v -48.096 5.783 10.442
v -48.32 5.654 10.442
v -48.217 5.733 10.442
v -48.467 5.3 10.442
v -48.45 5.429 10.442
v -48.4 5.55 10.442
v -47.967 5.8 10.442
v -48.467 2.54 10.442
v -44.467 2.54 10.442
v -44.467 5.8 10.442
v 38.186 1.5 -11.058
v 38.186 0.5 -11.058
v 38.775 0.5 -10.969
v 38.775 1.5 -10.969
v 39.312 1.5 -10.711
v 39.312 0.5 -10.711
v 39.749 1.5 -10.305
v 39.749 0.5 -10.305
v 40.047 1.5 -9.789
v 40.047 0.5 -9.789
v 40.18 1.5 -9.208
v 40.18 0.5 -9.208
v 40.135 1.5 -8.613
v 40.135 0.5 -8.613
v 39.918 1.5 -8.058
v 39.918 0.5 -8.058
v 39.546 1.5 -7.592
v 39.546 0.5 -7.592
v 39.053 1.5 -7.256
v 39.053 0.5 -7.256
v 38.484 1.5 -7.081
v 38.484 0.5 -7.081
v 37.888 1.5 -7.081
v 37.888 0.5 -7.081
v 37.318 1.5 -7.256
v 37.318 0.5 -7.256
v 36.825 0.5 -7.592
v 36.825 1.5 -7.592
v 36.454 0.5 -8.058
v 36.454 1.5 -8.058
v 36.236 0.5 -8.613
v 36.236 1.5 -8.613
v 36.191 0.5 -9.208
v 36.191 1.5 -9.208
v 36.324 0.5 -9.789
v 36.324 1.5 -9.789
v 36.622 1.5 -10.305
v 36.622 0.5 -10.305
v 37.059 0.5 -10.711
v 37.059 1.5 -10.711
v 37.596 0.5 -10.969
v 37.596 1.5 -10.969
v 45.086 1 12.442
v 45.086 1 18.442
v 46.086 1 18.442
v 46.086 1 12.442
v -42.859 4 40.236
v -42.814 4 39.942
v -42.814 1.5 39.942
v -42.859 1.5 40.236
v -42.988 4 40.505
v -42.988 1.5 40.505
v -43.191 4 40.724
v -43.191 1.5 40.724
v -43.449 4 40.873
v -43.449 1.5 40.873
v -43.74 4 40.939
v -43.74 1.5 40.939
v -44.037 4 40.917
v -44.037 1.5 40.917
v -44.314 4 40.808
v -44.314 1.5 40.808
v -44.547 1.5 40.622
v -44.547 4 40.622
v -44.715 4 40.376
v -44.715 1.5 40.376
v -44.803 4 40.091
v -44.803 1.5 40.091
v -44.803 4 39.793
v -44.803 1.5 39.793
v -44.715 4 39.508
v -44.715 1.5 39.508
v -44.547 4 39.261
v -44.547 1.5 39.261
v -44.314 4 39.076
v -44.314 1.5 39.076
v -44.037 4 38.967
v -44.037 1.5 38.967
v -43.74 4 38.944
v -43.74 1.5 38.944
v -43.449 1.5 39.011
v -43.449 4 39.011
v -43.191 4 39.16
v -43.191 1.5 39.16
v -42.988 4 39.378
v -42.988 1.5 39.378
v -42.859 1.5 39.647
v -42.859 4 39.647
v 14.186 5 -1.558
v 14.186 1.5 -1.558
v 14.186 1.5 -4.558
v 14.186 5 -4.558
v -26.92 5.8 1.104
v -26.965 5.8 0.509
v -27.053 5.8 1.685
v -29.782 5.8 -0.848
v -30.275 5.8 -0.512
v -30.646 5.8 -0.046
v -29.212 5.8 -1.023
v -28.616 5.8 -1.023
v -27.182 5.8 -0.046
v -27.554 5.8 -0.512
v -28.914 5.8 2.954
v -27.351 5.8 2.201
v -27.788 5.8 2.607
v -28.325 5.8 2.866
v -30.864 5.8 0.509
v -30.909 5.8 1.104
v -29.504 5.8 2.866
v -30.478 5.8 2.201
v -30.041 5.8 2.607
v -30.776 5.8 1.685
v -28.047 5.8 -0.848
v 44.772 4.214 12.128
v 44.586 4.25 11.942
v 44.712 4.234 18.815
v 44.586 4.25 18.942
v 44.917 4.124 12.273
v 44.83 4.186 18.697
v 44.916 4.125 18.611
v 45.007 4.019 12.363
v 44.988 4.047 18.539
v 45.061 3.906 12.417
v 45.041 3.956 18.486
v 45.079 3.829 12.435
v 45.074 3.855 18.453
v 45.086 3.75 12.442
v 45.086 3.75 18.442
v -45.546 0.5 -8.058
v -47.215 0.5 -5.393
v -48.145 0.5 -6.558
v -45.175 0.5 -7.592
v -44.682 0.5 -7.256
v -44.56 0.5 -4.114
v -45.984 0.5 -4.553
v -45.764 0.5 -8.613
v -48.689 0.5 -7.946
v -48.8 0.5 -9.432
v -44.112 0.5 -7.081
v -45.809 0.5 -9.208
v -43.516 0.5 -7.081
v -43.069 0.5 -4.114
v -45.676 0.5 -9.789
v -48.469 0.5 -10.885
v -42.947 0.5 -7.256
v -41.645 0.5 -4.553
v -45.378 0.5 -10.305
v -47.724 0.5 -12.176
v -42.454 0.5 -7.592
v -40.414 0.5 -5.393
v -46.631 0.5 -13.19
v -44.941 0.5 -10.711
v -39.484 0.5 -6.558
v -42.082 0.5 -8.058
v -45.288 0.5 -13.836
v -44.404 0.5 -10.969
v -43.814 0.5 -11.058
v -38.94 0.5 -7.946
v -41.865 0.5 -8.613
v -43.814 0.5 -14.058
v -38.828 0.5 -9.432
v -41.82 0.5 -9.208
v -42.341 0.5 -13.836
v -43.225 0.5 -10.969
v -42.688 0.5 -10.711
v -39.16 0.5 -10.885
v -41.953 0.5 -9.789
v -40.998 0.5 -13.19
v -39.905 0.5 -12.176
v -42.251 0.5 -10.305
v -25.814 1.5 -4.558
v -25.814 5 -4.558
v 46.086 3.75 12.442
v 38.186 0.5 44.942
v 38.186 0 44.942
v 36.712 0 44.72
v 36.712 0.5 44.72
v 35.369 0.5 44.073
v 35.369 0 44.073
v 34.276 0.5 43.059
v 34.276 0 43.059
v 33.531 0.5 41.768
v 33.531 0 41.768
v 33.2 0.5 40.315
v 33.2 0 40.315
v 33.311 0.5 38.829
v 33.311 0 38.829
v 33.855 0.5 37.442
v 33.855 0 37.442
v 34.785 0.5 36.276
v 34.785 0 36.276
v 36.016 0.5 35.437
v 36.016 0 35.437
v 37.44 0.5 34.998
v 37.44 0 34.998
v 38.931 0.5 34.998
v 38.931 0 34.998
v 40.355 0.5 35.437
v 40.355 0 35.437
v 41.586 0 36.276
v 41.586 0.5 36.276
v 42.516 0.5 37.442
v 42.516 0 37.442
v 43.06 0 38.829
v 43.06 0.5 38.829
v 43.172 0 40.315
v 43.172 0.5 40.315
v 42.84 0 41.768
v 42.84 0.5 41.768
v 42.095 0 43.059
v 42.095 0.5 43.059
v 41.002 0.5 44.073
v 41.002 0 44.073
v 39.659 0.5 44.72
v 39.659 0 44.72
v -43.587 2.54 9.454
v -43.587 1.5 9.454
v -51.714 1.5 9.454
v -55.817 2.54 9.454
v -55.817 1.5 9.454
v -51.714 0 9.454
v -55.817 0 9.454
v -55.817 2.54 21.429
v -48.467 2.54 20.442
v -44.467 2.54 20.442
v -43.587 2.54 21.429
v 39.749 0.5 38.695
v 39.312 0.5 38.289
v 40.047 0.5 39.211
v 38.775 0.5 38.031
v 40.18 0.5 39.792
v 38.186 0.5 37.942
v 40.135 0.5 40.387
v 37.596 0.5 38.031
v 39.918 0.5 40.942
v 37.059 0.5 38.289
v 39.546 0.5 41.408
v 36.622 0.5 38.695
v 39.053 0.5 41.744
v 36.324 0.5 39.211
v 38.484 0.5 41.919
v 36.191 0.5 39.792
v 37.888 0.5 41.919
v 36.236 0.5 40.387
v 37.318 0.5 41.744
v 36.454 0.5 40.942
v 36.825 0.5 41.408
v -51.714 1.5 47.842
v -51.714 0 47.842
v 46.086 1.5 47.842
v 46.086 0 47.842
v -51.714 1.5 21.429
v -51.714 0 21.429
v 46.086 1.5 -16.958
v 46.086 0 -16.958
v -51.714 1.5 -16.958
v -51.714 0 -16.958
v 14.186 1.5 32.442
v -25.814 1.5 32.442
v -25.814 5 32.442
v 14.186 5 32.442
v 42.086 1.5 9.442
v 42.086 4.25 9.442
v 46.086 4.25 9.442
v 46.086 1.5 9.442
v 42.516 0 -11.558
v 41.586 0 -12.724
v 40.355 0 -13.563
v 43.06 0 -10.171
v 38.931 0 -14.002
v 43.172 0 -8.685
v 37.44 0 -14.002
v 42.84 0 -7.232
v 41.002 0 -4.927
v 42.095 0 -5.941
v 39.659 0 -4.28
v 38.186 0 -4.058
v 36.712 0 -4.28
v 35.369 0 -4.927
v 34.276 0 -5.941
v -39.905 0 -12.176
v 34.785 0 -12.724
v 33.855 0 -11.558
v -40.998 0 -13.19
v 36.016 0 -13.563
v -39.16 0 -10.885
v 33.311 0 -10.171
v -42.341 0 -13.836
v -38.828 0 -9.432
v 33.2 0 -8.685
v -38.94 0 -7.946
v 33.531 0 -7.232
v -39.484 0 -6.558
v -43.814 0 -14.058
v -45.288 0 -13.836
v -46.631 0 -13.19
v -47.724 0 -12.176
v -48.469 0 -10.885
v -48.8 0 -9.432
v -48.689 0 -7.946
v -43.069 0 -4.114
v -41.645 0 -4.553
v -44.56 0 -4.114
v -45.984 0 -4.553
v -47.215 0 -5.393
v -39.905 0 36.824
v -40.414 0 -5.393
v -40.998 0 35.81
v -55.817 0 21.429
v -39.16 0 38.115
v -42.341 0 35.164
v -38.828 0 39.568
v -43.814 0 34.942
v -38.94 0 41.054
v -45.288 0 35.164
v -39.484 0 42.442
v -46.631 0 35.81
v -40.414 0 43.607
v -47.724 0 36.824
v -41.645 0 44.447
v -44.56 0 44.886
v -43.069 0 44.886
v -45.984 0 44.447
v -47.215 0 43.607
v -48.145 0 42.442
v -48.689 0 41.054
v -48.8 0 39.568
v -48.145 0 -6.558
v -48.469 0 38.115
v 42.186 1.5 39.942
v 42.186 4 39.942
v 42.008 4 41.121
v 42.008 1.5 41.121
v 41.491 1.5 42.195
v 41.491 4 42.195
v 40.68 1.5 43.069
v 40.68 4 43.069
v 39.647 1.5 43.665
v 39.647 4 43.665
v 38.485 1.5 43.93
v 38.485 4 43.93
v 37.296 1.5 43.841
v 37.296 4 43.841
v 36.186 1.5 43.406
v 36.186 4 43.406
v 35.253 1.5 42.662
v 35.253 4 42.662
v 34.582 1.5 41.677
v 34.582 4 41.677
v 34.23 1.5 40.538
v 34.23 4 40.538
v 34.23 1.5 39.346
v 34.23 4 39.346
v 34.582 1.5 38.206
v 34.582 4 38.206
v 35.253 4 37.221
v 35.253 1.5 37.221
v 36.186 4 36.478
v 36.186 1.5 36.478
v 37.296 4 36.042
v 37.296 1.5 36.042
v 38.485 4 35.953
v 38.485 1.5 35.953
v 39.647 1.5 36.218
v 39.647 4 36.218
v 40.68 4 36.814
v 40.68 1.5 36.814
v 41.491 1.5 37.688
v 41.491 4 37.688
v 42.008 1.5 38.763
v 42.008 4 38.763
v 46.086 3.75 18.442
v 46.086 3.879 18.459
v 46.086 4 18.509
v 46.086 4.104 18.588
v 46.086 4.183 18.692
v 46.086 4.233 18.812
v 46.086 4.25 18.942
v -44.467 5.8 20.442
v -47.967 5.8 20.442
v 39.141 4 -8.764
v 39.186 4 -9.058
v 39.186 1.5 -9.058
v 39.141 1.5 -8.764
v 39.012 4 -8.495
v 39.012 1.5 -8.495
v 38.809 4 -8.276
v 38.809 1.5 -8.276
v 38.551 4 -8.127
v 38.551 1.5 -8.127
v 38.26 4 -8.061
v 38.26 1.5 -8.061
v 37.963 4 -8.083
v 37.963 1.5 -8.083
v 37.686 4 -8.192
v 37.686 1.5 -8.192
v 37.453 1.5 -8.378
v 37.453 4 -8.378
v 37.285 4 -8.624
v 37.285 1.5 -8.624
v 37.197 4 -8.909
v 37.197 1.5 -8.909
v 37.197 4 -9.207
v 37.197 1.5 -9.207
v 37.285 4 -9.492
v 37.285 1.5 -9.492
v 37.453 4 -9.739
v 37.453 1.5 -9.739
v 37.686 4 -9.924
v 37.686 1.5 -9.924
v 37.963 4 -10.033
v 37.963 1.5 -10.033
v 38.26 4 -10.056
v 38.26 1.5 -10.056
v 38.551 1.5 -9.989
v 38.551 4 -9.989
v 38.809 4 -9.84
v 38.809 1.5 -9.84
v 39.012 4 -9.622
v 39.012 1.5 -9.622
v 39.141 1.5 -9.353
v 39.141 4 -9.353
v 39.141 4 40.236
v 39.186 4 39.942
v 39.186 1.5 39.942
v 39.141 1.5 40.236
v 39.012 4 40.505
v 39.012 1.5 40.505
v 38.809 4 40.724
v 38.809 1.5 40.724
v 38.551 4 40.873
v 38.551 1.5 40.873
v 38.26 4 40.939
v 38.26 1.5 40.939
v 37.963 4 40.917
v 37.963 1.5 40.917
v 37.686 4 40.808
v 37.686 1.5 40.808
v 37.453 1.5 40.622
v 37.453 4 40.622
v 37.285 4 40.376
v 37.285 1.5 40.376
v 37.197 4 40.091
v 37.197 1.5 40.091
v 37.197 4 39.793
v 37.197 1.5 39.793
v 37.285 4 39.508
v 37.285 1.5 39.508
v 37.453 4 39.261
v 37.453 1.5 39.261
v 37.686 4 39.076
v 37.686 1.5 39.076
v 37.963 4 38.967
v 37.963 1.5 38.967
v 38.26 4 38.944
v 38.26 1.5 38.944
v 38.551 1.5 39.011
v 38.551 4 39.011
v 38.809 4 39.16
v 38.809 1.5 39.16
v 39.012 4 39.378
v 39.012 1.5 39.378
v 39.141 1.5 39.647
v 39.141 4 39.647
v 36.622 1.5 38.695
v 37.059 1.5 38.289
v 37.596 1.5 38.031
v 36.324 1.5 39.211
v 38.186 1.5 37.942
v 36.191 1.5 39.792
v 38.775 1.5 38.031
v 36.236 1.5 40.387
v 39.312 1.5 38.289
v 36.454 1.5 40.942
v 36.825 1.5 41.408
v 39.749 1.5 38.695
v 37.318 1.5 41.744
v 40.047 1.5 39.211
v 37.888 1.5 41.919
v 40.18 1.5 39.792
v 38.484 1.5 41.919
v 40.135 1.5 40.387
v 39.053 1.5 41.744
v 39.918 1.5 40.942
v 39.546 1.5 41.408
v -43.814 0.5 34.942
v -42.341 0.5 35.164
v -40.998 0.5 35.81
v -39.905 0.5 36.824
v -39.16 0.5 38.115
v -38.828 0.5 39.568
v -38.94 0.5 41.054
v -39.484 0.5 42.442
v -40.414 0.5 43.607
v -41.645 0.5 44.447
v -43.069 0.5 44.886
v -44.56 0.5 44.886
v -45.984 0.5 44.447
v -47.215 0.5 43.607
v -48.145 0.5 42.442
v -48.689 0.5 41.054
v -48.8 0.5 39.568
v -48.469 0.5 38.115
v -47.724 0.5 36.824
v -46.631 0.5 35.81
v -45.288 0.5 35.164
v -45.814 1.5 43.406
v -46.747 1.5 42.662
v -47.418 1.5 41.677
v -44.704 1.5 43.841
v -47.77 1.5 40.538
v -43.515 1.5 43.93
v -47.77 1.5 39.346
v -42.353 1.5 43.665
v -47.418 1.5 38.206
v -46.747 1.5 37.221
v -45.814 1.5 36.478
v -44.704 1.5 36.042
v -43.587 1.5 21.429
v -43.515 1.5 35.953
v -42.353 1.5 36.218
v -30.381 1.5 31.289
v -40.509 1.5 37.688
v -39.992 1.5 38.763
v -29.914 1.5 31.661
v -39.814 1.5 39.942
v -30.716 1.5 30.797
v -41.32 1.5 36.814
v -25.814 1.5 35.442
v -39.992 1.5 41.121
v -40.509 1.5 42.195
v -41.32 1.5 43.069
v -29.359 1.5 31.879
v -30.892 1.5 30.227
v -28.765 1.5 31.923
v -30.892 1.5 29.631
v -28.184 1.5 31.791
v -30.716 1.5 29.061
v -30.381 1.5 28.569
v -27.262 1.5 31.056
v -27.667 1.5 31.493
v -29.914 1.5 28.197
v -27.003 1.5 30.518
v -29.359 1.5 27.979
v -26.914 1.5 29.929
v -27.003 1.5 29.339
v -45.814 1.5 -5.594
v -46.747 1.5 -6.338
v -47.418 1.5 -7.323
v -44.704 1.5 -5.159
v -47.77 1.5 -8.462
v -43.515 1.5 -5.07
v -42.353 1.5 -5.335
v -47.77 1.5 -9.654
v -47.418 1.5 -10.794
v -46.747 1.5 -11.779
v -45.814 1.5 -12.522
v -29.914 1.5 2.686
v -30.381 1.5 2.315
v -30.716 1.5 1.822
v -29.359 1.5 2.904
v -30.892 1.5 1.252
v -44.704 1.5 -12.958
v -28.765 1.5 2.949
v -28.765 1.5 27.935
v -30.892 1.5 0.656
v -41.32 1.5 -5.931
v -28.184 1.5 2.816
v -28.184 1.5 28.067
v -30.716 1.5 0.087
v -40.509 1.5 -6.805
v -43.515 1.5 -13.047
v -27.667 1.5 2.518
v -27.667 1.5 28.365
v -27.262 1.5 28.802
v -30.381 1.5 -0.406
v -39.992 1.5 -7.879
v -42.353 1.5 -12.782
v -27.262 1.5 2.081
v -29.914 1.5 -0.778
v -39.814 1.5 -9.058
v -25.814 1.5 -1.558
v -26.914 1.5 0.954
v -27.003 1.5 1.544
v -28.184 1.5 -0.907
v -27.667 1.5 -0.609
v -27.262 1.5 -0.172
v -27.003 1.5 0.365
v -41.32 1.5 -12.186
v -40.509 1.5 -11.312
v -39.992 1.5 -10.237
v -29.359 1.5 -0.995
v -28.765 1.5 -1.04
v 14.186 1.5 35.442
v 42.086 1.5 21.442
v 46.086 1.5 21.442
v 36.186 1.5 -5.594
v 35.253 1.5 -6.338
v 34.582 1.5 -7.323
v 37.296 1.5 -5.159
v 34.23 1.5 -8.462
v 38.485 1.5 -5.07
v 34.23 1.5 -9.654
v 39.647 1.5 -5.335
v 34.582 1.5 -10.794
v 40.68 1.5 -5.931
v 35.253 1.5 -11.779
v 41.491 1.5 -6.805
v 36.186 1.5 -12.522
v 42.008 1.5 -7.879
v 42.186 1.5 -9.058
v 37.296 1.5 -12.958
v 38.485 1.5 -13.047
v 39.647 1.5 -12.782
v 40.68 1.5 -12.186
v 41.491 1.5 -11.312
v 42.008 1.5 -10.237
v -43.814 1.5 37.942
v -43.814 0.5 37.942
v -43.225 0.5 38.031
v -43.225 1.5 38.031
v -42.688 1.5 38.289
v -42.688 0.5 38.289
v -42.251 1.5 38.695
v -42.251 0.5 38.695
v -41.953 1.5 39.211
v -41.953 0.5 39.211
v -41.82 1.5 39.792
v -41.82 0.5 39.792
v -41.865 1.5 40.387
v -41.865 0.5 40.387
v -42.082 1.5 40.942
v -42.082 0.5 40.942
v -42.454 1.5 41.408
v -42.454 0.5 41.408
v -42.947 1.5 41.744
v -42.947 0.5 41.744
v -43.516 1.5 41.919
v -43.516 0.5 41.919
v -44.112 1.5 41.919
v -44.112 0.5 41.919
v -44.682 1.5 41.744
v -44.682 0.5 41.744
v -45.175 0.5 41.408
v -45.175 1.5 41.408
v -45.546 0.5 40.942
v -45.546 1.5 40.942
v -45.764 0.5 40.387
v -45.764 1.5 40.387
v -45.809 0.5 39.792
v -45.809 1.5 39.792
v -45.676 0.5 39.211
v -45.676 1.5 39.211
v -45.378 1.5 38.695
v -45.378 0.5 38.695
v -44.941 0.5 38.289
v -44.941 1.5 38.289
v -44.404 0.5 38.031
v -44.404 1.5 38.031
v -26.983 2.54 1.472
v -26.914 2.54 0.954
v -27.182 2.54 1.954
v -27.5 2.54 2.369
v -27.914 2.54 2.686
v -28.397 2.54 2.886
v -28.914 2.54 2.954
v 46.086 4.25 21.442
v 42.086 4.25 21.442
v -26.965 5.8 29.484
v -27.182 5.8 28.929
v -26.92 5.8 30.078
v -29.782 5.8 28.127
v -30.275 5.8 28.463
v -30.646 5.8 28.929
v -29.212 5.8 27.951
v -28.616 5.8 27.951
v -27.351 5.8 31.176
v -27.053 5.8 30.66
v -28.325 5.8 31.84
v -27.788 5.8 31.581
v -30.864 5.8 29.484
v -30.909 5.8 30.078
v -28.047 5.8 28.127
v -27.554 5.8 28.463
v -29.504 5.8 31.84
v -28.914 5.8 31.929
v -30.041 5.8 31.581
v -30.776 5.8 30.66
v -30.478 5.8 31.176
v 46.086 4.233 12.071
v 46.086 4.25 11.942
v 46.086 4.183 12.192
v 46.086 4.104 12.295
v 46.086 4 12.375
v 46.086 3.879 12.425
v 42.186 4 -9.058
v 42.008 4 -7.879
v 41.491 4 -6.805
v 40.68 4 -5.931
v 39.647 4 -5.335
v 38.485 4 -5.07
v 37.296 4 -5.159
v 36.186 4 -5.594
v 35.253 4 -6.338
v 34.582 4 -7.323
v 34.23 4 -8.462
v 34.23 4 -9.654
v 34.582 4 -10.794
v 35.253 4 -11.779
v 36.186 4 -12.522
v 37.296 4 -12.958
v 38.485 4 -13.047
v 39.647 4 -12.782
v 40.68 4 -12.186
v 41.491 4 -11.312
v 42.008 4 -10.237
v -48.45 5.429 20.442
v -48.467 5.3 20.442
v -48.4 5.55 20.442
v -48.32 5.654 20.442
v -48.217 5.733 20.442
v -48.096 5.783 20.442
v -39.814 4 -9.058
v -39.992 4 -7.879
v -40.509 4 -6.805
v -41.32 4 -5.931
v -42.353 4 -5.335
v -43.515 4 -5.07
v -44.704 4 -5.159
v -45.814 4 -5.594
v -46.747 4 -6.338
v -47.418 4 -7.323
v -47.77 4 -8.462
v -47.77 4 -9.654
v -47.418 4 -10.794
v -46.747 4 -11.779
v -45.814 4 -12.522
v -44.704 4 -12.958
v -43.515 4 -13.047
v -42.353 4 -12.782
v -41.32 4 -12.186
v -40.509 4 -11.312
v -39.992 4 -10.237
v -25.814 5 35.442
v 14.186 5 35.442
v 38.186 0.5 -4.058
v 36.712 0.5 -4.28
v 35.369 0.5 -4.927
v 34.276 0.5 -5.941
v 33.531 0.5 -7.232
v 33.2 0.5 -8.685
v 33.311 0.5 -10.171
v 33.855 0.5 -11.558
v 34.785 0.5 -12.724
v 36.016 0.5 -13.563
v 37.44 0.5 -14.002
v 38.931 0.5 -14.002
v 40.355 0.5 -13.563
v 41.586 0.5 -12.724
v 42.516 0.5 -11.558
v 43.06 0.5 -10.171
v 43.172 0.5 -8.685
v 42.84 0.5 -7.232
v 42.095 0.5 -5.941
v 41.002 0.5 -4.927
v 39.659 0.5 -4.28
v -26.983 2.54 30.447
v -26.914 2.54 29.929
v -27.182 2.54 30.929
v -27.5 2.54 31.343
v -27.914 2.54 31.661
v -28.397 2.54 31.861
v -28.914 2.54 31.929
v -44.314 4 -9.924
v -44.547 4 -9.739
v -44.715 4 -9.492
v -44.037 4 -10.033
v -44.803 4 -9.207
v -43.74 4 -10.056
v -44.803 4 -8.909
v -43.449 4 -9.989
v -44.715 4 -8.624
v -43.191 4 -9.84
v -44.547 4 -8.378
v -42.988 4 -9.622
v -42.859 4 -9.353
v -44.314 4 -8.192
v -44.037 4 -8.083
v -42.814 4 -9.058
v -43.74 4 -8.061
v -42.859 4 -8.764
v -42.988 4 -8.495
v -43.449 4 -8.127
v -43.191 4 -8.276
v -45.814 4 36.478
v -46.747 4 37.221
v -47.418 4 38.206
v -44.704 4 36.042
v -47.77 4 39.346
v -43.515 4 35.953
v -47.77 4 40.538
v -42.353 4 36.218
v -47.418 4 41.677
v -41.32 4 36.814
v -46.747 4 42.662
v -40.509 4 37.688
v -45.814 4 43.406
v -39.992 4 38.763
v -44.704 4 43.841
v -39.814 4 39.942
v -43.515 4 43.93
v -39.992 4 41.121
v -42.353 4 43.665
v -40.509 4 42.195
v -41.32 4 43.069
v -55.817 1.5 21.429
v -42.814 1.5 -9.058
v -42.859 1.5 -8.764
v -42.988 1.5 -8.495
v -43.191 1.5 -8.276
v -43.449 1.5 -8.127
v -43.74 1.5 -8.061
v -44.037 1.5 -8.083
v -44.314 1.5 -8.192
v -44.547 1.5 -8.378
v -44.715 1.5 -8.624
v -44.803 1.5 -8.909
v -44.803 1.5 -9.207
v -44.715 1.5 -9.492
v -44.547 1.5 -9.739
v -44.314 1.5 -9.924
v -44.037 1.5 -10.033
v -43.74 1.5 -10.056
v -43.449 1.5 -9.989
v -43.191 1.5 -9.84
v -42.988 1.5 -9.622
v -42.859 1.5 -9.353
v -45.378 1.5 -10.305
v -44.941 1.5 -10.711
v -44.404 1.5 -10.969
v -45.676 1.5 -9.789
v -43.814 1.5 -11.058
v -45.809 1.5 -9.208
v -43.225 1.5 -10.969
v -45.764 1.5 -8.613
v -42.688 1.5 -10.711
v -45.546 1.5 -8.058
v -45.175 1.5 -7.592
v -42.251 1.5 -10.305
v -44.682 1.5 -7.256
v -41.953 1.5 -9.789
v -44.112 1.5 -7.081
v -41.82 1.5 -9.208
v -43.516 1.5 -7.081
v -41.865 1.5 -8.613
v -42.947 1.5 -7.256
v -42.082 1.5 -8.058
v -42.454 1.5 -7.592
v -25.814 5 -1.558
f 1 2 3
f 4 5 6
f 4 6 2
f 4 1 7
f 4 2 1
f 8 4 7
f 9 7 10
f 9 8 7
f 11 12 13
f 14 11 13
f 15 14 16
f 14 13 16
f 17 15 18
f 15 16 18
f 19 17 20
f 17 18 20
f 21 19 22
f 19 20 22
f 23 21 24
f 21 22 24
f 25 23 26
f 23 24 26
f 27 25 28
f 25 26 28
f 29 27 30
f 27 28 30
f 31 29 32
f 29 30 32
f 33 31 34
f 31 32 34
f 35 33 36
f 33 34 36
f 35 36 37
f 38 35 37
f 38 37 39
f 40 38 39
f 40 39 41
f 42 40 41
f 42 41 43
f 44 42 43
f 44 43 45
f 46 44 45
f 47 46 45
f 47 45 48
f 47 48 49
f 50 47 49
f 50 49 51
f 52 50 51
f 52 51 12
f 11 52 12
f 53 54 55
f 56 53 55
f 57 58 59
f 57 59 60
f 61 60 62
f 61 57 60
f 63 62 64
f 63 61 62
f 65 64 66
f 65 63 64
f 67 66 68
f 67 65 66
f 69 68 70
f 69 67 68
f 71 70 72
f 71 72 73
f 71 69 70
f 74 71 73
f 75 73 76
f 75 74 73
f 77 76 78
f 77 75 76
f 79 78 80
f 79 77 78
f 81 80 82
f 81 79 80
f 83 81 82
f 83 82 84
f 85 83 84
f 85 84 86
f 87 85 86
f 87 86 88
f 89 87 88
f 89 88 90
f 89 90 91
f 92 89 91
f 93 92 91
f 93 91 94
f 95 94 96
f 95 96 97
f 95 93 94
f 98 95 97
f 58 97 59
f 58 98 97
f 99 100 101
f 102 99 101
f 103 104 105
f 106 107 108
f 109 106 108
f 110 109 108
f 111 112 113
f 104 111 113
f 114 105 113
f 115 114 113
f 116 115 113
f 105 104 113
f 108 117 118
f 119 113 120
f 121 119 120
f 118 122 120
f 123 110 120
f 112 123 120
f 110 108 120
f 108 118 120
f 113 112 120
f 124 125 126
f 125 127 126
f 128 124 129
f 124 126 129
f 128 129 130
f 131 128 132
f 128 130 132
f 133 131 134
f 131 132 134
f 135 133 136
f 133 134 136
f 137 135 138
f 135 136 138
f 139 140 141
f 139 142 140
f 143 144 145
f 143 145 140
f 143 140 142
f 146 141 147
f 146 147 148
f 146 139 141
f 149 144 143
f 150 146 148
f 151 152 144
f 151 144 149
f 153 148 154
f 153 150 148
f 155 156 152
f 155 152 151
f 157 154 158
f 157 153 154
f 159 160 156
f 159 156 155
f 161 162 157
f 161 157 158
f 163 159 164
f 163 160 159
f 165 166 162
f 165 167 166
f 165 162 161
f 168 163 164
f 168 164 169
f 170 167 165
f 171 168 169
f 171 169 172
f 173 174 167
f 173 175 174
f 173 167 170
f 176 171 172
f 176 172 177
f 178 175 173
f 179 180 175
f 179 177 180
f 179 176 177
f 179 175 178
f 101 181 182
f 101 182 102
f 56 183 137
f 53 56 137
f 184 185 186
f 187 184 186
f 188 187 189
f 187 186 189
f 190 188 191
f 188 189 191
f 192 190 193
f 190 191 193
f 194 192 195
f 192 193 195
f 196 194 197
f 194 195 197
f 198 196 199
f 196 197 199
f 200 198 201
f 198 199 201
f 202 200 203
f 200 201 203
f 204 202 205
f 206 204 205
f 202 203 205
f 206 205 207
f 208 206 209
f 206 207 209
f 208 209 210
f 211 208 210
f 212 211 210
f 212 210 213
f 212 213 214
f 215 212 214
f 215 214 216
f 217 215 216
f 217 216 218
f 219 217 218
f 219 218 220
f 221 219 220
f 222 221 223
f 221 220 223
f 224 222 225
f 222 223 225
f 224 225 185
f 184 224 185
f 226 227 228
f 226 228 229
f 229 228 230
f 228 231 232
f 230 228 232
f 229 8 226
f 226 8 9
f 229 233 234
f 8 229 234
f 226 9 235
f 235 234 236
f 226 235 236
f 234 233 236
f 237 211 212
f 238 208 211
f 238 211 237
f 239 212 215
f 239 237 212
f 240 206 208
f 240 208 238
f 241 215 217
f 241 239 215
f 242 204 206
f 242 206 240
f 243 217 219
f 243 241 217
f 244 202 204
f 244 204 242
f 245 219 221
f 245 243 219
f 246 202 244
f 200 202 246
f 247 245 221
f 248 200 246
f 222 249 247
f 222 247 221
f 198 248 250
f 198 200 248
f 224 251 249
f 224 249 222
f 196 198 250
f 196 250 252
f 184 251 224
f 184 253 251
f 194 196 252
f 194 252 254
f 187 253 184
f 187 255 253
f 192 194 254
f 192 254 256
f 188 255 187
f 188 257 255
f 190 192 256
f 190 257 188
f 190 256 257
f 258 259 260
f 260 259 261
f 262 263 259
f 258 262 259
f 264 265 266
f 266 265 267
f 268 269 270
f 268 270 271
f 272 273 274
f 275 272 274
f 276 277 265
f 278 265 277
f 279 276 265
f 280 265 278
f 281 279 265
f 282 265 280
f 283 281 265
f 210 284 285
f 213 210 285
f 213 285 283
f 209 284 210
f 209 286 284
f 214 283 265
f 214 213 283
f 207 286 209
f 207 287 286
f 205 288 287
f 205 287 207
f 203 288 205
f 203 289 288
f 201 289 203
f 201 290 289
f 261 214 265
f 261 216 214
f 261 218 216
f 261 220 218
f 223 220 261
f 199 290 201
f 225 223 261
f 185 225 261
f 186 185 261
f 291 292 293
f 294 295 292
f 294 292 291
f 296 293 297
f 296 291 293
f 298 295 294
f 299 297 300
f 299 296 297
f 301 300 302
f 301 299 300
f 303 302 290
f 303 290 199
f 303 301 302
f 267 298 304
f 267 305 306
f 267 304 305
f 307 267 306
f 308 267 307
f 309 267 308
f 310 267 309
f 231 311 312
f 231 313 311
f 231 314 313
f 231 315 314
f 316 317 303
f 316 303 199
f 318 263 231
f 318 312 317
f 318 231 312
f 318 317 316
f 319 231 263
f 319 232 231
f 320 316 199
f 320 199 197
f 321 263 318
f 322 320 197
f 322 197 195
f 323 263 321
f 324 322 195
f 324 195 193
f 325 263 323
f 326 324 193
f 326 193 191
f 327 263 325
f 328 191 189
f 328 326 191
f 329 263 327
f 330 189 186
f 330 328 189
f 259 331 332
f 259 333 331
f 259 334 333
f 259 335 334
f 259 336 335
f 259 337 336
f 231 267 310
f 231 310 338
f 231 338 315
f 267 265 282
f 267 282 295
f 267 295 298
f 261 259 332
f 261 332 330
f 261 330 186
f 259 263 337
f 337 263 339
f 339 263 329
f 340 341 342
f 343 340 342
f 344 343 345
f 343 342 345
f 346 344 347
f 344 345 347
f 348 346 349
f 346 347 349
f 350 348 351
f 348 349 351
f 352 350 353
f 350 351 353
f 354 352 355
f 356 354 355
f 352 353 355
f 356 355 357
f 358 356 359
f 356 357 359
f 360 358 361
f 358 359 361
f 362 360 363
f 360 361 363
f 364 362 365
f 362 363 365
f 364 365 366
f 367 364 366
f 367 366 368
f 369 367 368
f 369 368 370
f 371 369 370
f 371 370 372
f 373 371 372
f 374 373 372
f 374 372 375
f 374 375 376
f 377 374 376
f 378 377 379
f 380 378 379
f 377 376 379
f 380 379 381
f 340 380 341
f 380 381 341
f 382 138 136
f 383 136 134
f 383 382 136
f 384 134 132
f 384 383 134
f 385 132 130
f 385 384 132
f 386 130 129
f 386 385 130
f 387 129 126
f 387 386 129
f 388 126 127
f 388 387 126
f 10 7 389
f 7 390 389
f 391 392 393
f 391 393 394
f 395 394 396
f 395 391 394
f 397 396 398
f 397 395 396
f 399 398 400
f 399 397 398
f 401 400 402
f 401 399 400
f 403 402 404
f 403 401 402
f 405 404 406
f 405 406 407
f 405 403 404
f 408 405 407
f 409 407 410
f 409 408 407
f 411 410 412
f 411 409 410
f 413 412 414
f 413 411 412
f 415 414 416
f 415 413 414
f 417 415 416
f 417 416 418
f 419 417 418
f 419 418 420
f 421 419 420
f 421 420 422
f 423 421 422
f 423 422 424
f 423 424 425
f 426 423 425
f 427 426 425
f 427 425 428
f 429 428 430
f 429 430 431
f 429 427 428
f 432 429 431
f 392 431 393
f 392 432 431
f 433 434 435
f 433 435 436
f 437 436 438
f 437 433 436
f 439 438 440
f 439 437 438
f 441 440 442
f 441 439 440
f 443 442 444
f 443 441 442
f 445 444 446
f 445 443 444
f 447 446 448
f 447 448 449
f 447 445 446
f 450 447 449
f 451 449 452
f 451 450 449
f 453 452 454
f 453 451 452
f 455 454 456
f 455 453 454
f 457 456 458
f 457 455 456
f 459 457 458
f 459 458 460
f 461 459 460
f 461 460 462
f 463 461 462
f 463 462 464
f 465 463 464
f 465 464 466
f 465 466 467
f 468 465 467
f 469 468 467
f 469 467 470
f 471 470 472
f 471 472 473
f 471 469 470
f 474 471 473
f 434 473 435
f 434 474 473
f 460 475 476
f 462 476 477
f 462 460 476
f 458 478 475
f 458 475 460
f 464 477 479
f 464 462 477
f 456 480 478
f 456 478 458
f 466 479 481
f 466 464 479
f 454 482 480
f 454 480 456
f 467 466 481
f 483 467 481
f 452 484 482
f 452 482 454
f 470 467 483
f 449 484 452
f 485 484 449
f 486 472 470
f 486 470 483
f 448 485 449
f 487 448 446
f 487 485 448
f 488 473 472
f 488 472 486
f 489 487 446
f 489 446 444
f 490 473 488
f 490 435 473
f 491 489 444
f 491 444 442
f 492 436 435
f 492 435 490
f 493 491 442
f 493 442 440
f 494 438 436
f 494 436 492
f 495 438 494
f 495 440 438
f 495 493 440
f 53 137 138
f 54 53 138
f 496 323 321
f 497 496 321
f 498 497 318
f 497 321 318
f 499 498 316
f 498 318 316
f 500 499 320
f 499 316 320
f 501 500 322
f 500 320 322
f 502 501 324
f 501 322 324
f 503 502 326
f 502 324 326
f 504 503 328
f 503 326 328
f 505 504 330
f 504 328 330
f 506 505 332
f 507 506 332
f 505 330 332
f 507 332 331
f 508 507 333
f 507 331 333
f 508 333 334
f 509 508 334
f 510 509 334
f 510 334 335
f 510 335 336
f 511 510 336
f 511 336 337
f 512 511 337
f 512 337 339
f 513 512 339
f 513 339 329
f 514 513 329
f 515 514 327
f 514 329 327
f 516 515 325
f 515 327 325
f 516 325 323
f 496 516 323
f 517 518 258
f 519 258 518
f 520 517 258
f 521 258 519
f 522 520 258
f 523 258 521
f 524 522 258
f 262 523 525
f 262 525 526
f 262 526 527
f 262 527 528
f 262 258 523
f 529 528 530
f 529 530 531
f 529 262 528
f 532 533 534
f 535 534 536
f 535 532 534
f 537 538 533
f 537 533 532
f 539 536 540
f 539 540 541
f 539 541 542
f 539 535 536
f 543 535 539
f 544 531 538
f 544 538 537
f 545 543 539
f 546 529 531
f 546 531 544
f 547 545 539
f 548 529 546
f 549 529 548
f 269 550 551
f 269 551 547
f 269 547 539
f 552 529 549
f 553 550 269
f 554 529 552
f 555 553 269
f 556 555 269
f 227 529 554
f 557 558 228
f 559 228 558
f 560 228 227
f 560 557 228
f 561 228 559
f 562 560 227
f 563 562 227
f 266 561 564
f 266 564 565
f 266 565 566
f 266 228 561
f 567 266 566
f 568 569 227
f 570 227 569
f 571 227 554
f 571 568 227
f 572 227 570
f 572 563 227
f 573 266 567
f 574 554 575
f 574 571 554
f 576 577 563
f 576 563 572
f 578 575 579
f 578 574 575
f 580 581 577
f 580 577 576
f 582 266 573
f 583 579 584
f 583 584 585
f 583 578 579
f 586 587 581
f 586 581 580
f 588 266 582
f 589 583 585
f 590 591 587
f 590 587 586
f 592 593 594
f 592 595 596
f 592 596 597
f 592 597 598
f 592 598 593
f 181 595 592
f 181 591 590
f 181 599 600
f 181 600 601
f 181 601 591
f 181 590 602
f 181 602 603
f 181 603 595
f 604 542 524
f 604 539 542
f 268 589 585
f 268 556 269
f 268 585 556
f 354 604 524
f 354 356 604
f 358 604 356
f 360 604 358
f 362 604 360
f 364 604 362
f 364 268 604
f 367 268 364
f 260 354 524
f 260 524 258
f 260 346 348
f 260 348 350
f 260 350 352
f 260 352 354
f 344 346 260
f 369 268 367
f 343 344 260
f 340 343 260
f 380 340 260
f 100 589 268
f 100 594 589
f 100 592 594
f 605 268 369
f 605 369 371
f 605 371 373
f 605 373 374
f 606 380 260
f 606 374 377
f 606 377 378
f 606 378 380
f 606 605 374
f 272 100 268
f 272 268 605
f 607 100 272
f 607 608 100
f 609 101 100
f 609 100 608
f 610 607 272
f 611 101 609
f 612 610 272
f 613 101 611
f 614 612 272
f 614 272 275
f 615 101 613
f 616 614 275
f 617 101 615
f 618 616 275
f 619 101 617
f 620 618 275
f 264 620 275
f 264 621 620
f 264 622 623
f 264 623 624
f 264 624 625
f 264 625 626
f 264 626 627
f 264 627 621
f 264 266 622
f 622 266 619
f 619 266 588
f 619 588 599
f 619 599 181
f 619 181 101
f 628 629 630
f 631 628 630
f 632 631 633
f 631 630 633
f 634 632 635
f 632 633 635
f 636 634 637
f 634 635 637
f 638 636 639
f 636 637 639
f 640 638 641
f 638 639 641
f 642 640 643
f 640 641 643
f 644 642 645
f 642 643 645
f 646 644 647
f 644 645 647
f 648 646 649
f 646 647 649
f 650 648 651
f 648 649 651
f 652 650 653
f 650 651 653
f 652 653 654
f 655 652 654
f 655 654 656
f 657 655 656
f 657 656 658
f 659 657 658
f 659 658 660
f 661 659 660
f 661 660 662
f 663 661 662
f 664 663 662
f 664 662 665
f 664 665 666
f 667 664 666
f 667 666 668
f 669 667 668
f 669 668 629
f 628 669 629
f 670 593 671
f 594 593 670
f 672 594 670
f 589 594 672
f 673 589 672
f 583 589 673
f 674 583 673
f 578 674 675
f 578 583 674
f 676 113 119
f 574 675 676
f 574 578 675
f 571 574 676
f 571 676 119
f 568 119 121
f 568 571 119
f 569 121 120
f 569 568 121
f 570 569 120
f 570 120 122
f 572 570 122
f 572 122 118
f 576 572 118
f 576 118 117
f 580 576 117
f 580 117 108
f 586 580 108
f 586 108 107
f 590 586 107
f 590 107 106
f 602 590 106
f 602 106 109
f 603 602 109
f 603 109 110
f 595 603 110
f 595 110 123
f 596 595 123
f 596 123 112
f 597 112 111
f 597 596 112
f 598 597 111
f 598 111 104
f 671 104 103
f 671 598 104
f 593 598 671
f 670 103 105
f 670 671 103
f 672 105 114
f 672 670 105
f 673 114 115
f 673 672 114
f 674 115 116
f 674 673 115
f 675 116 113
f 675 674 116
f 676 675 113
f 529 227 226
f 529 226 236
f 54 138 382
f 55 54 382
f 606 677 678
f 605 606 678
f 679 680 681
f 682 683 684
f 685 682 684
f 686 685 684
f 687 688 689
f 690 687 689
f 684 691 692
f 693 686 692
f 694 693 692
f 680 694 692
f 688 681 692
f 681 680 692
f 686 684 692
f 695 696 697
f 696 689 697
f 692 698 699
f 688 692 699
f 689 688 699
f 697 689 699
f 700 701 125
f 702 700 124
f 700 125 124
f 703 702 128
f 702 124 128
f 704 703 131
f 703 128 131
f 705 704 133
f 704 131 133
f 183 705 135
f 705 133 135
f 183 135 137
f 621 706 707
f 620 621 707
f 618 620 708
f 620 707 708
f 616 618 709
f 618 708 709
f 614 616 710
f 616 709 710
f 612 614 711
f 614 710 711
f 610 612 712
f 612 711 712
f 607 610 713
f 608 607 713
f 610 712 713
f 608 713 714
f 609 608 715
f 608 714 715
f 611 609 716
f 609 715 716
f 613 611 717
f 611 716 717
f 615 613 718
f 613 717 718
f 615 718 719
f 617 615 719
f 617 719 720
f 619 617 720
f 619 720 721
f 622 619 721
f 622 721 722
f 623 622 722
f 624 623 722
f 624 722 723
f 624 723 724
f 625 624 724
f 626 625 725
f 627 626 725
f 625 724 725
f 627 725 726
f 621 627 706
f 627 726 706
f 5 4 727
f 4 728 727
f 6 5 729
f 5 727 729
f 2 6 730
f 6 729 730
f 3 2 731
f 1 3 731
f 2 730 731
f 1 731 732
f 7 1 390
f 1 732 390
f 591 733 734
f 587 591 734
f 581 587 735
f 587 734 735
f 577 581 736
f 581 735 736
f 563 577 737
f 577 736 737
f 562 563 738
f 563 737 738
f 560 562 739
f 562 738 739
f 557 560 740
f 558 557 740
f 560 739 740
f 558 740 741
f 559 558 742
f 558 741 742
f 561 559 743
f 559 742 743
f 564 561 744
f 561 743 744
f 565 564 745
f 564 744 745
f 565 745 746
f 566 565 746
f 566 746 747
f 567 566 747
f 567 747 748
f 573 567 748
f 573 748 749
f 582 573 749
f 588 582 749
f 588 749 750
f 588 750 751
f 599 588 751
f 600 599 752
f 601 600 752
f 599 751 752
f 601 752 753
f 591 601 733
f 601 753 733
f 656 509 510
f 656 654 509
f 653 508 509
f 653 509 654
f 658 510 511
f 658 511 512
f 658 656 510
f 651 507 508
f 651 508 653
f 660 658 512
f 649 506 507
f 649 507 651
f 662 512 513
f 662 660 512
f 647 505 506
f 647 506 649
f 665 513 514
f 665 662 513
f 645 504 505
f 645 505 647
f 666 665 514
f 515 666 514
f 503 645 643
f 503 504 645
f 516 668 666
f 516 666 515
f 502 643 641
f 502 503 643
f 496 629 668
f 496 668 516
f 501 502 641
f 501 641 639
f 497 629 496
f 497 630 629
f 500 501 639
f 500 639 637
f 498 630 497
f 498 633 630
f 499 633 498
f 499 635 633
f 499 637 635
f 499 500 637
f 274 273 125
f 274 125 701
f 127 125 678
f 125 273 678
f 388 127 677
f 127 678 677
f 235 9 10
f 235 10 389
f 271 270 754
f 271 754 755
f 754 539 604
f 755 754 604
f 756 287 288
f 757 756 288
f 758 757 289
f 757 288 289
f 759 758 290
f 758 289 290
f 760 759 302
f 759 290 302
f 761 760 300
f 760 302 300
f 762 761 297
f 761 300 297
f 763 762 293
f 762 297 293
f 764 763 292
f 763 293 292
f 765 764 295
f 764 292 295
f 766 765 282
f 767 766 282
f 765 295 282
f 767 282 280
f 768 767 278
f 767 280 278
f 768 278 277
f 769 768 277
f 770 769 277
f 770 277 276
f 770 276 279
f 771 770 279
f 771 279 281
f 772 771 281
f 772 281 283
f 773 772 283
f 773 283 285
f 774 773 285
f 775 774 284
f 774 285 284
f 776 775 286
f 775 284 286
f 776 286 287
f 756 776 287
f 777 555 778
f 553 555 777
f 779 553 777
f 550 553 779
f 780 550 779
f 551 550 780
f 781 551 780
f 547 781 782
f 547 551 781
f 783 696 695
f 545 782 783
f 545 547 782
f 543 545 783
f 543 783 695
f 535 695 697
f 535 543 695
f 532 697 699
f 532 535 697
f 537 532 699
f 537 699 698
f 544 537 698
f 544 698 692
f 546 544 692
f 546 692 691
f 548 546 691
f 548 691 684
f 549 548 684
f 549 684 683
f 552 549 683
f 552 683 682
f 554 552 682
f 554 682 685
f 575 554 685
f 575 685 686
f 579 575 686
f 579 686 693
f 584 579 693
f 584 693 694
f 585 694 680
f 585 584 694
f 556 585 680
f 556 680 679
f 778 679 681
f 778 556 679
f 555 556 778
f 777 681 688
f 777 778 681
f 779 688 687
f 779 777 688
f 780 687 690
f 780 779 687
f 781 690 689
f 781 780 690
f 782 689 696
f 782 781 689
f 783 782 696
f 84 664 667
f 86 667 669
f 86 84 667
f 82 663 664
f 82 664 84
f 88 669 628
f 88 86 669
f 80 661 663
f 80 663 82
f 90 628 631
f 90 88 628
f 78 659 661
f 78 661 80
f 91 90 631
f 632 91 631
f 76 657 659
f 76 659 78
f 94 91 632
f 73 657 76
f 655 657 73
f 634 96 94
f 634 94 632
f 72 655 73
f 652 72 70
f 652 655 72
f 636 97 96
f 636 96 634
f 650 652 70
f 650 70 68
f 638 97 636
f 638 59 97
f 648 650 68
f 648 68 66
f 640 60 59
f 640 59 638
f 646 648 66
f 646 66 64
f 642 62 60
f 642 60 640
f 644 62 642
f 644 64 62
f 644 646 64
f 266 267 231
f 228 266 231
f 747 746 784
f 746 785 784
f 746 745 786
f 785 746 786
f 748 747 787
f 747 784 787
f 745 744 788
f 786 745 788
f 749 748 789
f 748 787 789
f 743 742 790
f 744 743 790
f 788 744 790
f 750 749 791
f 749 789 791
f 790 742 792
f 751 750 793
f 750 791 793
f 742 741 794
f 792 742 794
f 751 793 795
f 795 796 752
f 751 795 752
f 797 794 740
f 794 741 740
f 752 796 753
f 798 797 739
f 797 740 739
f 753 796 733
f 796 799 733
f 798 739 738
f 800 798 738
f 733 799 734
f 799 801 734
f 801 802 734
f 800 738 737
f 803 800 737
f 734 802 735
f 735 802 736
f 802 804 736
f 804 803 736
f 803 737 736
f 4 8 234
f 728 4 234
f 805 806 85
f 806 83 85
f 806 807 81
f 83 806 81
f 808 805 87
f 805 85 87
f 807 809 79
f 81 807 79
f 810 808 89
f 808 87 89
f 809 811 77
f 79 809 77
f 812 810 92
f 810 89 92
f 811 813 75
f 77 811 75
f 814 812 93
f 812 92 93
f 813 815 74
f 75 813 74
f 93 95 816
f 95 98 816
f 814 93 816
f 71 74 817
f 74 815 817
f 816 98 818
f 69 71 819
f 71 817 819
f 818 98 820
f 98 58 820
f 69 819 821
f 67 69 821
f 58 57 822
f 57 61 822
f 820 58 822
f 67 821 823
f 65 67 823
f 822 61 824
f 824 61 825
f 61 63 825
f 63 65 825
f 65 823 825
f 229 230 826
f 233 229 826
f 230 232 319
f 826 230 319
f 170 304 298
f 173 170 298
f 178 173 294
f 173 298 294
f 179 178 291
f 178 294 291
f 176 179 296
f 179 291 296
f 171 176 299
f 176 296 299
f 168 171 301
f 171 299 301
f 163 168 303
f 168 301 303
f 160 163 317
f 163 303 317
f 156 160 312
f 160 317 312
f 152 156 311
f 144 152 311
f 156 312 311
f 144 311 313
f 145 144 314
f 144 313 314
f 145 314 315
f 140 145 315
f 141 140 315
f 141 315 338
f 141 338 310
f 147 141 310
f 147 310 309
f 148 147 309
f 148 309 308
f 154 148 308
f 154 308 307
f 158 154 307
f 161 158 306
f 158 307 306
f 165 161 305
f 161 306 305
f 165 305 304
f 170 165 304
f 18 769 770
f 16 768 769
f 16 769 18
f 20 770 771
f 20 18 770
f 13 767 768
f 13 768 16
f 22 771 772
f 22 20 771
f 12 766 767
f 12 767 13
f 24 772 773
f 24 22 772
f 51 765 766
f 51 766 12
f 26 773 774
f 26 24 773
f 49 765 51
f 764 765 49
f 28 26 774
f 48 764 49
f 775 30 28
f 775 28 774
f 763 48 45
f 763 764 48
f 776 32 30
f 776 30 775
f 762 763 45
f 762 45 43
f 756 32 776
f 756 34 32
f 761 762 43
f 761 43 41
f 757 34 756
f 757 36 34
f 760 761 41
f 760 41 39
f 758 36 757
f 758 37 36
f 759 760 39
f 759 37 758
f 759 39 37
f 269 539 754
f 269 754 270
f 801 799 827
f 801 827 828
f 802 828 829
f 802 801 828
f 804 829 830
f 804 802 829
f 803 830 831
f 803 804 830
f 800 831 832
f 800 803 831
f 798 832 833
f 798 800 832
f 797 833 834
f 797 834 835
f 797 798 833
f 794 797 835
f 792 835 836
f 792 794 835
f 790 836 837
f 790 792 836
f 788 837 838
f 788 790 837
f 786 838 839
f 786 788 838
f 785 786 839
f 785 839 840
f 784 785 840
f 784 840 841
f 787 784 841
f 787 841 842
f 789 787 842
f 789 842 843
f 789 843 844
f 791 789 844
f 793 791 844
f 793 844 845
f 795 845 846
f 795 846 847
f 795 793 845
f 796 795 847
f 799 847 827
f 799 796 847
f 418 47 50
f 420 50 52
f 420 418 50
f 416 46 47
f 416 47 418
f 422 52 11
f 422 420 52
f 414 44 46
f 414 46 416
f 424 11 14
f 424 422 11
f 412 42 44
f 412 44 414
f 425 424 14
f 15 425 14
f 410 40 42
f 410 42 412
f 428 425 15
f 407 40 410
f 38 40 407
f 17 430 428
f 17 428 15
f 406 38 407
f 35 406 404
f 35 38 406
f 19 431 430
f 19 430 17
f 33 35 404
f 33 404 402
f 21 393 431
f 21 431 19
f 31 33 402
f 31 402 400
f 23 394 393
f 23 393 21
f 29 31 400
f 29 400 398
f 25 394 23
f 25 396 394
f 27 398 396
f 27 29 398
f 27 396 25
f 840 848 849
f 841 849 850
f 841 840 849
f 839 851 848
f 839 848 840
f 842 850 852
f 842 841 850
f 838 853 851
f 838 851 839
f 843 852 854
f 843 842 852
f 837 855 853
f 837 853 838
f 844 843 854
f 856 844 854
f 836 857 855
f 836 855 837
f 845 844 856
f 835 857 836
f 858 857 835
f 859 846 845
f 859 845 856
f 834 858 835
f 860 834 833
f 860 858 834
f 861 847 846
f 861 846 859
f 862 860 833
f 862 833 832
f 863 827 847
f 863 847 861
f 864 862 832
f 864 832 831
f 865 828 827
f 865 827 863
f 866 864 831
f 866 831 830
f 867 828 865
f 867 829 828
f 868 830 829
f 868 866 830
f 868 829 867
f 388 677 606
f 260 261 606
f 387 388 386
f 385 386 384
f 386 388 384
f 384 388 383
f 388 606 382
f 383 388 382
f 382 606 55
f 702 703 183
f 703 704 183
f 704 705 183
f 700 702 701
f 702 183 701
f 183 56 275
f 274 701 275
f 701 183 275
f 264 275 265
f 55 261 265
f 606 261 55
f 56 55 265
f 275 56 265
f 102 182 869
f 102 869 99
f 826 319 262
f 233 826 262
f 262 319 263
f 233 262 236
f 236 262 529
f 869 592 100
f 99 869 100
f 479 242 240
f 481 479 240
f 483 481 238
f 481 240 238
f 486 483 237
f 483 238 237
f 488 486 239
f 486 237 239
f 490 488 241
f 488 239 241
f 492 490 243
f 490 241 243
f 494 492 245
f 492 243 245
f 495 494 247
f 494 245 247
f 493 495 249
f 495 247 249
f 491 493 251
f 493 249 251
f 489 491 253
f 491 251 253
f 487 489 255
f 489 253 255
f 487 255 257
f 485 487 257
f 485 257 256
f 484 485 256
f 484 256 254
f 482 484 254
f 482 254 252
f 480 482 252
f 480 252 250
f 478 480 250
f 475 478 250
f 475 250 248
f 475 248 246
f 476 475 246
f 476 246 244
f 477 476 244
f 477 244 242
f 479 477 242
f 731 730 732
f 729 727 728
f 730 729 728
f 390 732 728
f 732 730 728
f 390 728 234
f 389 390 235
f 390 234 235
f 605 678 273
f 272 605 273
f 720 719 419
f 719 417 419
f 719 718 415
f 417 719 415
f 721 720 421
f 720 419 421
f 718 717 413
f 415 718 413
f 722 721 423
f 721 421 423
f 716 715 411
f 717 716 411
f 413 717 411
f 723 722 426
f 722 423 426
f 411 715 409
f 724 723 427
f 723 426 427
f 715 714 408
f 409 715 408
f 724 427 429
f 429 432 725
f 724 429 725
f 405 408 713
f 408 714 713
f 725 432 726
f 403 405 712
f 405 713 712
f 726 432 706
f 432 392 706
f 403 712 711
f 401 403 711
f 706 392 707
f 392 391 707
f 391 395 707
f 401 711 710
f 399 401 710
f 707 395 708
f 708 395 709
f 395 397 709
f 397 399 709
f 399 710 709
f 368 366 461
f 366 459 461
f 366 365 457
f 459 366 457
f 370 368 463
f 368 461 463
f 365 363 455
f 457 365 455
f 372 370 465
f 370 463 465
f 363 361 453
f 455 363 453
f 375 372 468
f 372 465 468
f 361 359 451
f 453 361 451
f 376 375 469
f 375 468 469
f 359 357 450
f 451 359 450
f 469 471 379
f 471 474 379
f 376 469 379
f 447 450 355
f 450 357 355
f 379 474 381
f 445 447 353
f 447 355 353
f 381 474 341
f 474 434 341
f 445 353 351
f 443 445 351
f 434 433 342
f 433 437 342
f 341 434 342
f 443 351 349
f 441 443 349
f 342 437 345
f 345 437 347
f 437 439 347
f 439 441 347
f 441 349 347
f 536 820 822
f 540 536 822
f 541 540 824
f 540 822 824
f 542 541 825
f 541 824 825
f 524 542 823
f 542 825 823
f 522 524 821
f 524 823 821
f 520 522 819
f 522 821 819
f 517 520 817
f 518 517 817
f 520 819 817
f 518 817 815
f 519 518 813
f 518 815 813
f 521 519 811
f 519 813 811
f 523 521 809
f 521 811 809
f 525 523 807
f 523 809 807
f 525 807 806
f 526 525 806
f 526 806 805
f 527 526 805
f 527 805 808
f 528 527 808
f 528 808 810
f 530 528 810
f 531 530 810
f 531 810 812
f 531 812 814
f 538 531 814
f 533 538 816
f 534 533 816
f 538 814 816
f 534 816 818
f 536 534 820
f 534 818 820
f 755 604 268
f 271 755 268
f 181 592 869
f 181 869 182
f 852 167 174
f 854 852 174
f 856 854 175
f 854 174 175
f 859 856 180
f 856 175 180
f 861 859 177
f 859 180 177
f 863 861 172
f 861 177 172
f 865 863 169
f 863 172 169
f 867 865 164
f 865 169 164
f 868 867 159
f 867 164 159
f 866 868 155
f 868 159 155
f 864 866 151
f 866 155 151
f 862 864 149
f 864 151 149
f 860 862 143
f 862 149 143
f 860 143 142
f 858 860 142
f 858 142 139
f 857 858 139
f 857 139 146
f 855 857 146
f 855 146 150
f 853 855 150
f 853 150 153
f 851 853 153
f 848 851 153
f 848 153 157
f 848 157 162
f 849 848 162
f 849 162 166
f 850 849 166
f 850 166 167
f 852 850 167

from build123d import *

# Parameters (mm, degrees)
EXTRUDE_1_DEPTH     = 1.5
SKETCH_2_R          = 5
CUT_EXTRUDE_1_DEPTH = 0.5
SKETCH_11_R         = 2
SKETCH_11_W         = 12.230000073
SKETCH_11_H         = 11.974599949
EXTRUDE_5_DEPTH     = 2.539974634
SKETCH_13_R         = 2
SKETCH_13_W         = 4
SKETCH_13_H         = 10
TYPEC_2_DEPTH       = 5.7999746
LED_3_START         = -4.25
LED_3_DEPTH         = 2.75
LED_1_R             = 0.5
CUT_EXTRUDE_2_REACH = 75.743
SKETCH_15_R         = 2
EXTRUDE_START       = -4
SKETCH_16_R         = 4
SKETCH_16_R_2       = 1
EXTRUDE_4_DEPTH     = 2.5
LED_2_START         = -1.5
SKETCH_17_W         = 1
SKETCH_17_H         = 6
LED_2_DEPTH         = 0.5
SKETCH_18_W         = 40
SKETCH_18_H         = 3
EXTRUDE_2_DEPTH     = 3.5


with BuildPart() as part:
    # 草图1 → 凸台-拉伸1 (new body)
    with BuildSketch(Plane(origin=(0, 0, 0), x_dir=(1, 0, 0), z_dir=(0, 1, 0))):
        Polygon((-51.714401712, -9.454370264), (-55.816720774, -9.454370264), (-55.816720774, -21.428970213), (-51.714401712, -21.428970213), (-51.714401712, -47.841670238), (46.085598288, -47.841670238), (46.085598288, 16.958329762), (-51.714401712, 16.958329762), align=None)
    extrude(amount=EXTRUDE_1_DEPTH)

    # 草图2 → 防滑切除-拉伸1 (cut)
    with BuildSketch(Plane.XZ):
        with Locations(Location((-43.814401712, -9.058329762, 0), (0, 0, 270))):
            Circle(SKETCH_2_R)
        with Locations(Location((-43.814401712, 39.941670238, 0), (0, 0, 270))):
            Circle(SKETCH_2_R)
        with Locations(Location((38.185598288, 39.941670238, 0), (0, 0, 90))):
            Circle(SKETCH_2_R)
        with Locations(Location((38.185598288, -9.058329762, 0), (0, 0, 90))):
            Circle(SKETCH_2_R)
    extrude(amount=-CUT_EXTRUDE_1_DEPTH, mode=Mode.SUBTRACT)

    # 草图11 → 充电板档板凸台-拉伸5 (add)
    with BuildSketch(Plane.XZ):
        with Locations((-28.914401712, 29.928970213)):
            Circle(SKETCH_11_R)
        with Locations((-28.914401712, 0.954370264)):
            Circle(SKETCH_11_R)
        with Locations((-49.701720738, 15.441670239)):
            Rectangle(SKETCH_11_W, SKETCH_11_H)
    extrude(amount=-EXTRUDE_5_DEPTH)

    # 草图13 → TypeC支撑凸台-拉伸2 (add)
    with BuildSketch(Plane.XZ):
        with Locations(Location((-28.914401712, 29.928970213, 0), (0, 0, 90))):
            Circle(SKETCH_13_R)
        with Locations(Location((-28.914401712, 0.954370264, 0), (0, 0, 90))):
            Circle(SKETCH_13_R)
        with Locations((-46.466720701, 15.441670238)):
            Rectangle(SKETCH_13_W, SKETCH_13_H)
    extrude(amount=-TYPEC_2_DEPTH)

    # 草图14 → LED限位凸台-拉伸3 (add)
    with BuildSketch(Plane.XZ.offset(LED_3_START)):
        Polygon((45.085598288, 12.441670238), (45.085598288, 18.441670238), (46.085598288, 18.441670238), (46.085598288, 21.441670238), (42.085598288, 21.441670238), (42.085598288, 9.441670238), (46.085598288, 9.441670238), (46.085598288, 12.441670238), align=None)
    extrude(amount=LED_3_DEPTH)

    # LED限位圆角1
    led_1_edges = [part.edges().sort_by_distance(p)[0] for p in [
        (45.585598288, 4.25, 18.441670238),
        (45.585598288, 4.25, 12.441670238),
        (45.085598288, 4.25, 15.441670238),
        (-48.466720701, 5.7999746, 15.441670238),
    ]]
    fillet(led_1_edges, radius=LED_1_R)

    # 草图15 → 螺丝孔位切除-拉伸2 (cut, up to next)
    with BuildSketch(Plane.XZ, mode=Mode.PRIVATE) as cut_extrude_2_sk1:
        with Locations(Location((-43.814401712, -9.058329762, 0), (0, 0, 270))):
            Circle(SKETCH_15_R)
    cut_extrude_2_tool1 = extrude(cut_extrude_2_sk1.sketch, amount=-CUT_EXTRUDE_2_REACH, mode=Mode.PRIVATE) & part.part
    # 草图15 → 螺丝孔位切除-拉伸2 (cut, up to next)
    with BuildSketch(Plane.XZ, mode=Mode.PRIVATE) as cut_extrude_2_sk2:
        with Locations(Location((-43.814401712, 39.941670238, 0), (0, 0, 270))):
            Circle(SKETCH_15_R)
    cut_extrude_2_tool2 = extrude(cut_extrude_2_sk2.sketch, amount=-CUT_EXTRUDE_2_REACH, mode=Mode.PRIVATE) & part.part
    # 草图15 → 螺丝孔位切除-拉伸2 (cut, up to next)
    with BuildSketch(Plane.XZ, mode=Mode.PRIVATE) as cut_extrude_2_sk3:
        with Locations(Location((38.185598288, -9.058329762, 0), (0, 0, 270))):
            Circle(SKETCH_15_R)
    cut_extrude_2_tool3 = extrude(cut_extrude_2_sk3.sketch, amount=-CUT_EXTRUDE_2_REACH, mode=Mode.PRIVATE) & part.part
    # 草图15 → 螺丝孔位切除-拉伸2 (cut, up to next)
    with BuildSketch(Plane.XZ, mode=Mode.PRIVATE) as cut_extrude_2_sk4:
        with Locations(Location((38.185598288, 39.941670238, 0), (0, 0, 270))):
            Circle(SKETCH_15_R)
    cut_extrude_2_tool4 = extrude(cut_extrude_2_sk4.sketch, amount=-CUT_EXTRUDE_2_REACH, mode=Mode.PRIVATE) & part.part
    add(cut_extrude_2_tool1.solids().sort_by_distance((-43.814402, 0, -9.05833))[0], mode=Mode.SUBTRACT)
    add(cut_extrude_2_tool2.solids().sort_by_distance((-43.814402, 0, 39.94167))[0], mode=Mode.SUBTRACT)
    add(cut_extrude_2_tool3.solids().sort_by_distance((38.185598, 0, -9.05833))[0], mode=Mode.SUBTRACT)
    add(cut_extrude_2_tool4.solids().sort_by_distance((38.185598, 0, 39.94167))[0], mode=Mode.SUBTRACT)

    # 草图16 → 螺丝孔凸台-拉伸4 (add)
    # profile 1 of 4: a face of its own
    with BuildSketch(Plane.XZ.offset(EXTRUDE_START)):
        with Locations((38.185598288, -9.058329762)):
            Circle(SKETCH_16_R)
        with Locations((38.185598288, -9.058329762)):
            Circle(SKETCH_16_R_2, mode=Mode.SUBTRACT)
    # profile 2 of 4: a face of its own
    with BuildSketch(Plane.XZ.offset(EXTRUDE_START)):
        with Locations((38.185598288, 39.941670238)):
            Circle(SKETCH_16_R)
        with Locations((38.185598288, 39.941670238)):
            Circle(SKETCH_16_R_2, mode=Mode.SUBTRACT)
    # profile 3 of 4: a face of its own
    with BuildSketch(Plane.XZ.offset(EXTRUDE_START)):
        with Locations((-43.814401712, -9.058329762)):
            Circle(SKETCH_16_R)
        with Locations((-43.814401712, -9.058329762)):
            Circle(SKETCH_16_R_2, mode=Mode.SUBTRACT)
    # profile 4 of 4: a face of its own
    with BuildSketch(Plane.XZ.offset(EXTRUDE_START)):
        with Locations((-43.814401712, 39.941670238)):
            Circle(SKETCH_16_R)
        with Locations((-43.814401712, 39.941670238)):
            Circle(SKETCH_16_R_2, mode=Mode.SUBTRACT)
    extrude(amount=EXTRUDE_4_DEPTH)

    # 草图17 → LED灯嵌入切除-拉伸2 (cut)
    with BuildSketch(Plane.XZ.offset(LED_2_START)):
        with Locations((45.585598288, 15.441670238)):
            Rectangle(SKETCH_17_W, SKETCH_17_H)
    extrude(amount=LED_2_DEPTH, mode=Mode.SUBTRACT)

    # 草图18 → 散热板支撑凸台-拉伸2 (add)
    with BuildSketch(Plane(origin=(0, 1.5, 0), x_dir=(1, 0, 0), z_dir=(0, 1, 0))):
        with Locations((-5.814401712, 3.058329762)):
            Rectangle(SKETCH_18_W, SKETCH_18_H)
        with Locations((-5.814401712, -33.941670238)):
            Rectangle(SKETCH_18_W, SKETCH_18_H)
    extrude(amount=EXTRUDE_2_DEPTH)


solid = part.part
